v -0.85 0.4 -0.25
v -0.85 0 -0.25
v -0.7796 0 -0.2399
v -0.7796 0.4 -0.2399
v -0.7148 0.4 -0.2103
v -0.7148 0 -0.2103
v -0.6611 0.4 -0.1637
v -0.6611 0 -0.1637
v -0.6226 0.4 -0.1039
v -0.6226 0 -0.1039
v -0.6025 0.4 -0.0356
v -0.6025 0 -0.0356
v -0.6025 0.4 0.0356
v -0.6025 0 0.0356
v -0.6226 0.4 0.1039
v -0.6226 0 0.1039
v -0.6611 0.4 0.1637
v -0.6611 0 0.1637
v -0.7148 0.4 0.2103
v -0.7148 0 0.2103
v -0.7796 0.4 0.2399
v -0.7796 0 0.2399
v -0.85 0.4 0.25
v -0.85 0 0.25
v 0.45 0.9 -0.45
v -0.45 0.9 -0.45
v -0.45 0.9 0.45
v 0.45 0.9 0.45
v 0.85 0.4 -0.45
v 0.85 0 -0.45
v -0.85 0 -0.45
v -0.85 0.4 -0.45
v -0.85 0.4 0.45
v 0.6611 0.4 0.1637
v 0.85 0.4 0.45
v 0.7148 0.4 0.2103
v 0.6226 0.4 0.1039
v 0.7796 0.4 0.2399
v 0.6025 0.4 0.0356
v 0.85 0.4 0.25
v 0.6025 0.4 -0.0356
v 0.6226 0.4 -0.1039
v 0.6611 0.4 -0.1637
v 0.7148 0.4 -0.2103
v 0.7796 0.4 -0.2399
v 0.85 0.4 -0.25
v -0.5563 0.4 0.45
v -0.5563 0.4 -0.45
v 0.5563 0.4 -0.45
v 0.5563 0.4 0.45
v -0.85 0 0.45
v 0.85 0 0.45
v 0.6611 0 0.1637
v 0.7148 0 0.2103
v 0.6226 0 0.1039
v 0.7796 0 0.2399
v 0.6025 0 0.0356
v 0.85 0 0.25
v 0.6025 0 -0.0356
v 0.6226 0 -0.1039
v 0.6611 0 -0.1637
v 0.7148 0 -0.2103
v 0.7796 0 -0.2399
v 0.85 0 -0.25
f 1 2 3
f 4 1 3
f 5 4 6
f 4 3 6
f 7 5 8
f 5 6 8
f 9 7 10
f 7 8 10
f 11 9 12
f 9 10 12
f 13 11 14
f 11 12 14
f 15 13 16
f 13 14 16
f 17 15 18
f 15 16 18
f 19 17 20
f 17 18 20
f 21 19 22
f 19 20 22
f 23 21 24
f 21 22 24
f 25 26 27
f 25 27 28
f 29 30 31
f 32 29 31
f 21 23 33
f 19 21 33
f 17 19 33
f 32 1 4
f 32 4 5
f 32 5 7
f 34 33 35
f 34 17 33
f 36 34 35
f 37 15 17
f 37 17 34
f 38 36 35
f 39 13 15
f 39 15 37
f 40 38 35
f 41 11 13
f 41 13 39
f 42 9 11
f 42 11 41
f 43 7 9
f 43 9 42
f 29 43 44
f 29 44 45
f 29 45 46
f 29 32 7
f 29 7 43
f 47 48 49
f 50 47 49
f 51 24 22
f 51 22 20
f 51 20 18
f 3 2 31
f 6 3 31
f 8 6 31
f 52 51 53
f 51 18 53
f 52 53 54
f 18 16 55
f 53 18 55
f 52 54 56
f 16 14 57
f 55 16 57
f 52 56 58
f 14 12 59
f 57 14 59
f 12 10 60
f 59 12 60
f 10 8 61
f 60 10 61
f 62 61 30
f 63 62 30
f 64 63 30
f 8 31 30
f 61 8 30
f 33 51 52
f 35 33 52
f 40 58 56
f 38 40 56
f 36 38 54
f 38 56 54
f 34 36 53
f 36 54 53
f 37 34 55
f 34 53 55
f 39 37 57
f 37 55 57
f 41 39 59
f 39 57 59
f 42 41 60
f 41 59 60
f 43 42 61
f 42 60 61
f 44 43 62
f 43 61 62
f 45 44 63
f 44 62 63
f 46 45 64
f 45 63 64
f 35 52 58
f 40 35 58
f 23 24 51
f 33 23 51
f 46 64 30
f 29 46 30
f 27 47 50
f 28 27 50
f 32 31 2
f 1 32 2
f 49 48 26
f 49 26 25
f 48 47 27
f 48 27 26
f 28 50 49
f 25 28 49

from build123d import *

# Parameters (mm, degrees)
BOSS_EXTRUDE1_DEPTH = 0.4
SKETCH2_W           = 0.9
SKETCH2_H           = 0.9
BOSS_EXTRUDE2_DEPTH = 0.5
DRAFT2_ANGLE        = 12


with BuildPart() as part:
    # Sketch1 → Boss-Extrude1 (new body)
    with BuildSketch(Plane(origin=(0, 0, 0), x_dir=(1, 0, 0), z_dir=(0, 1, 0))):
        with BuildLine():
            Line((-0.85, -0.45), (0.85, -0.45))
            Line((0.85, -0.45), (0.85, -0.25))
            ThreePointArc((0.85, -0.25), (0.6, 0), (0.85, 0.25))
            Line((0.85, 0.25), (0.85, 0.45))
            Line((0.85, 0.45), (-0.85, 0.45))
            Line((-0.85, 0.45), (-0.85, 0.25))
            ThreePointArc((-0.85, 0.25), (-0.6, 0), (-0.85, -0.25))
            Line((-0.85, -0.25), (-0.85, -0.45))
        make_face()
    extrude(amount=BOSS_EXTRUDE1_DEPTH)


with BuildPart() as body_2:
    # Sketch2 → Boss-Extrude2 (new body)
    with BuildSketch(Plane(origin=(0, 0.4, 0), x_dir=(1, 0, 0), z_dir=(0, 1, 0))):
        Rectangle(SKETCH2_W, SKETCH2_H)
    extrude(amount=BOSS_EXTRUDE2_DEPTH)

    # Draft2
    draft2_faces = [body_2.faces().sort_by_distance(p)[0] for p in [
        (-0.45, 0.65, 0),
        (0.45, 0.65, 0),
    ]]
    draft(draft2_faces, Plane(origin=(-0.45, 0.9, -0.45), x_dir=(0, 0, 1), z_dir=(0, 1, 0)), DRAFT2_ANGLE)


solid = Compound([part.part, body_2.part])
